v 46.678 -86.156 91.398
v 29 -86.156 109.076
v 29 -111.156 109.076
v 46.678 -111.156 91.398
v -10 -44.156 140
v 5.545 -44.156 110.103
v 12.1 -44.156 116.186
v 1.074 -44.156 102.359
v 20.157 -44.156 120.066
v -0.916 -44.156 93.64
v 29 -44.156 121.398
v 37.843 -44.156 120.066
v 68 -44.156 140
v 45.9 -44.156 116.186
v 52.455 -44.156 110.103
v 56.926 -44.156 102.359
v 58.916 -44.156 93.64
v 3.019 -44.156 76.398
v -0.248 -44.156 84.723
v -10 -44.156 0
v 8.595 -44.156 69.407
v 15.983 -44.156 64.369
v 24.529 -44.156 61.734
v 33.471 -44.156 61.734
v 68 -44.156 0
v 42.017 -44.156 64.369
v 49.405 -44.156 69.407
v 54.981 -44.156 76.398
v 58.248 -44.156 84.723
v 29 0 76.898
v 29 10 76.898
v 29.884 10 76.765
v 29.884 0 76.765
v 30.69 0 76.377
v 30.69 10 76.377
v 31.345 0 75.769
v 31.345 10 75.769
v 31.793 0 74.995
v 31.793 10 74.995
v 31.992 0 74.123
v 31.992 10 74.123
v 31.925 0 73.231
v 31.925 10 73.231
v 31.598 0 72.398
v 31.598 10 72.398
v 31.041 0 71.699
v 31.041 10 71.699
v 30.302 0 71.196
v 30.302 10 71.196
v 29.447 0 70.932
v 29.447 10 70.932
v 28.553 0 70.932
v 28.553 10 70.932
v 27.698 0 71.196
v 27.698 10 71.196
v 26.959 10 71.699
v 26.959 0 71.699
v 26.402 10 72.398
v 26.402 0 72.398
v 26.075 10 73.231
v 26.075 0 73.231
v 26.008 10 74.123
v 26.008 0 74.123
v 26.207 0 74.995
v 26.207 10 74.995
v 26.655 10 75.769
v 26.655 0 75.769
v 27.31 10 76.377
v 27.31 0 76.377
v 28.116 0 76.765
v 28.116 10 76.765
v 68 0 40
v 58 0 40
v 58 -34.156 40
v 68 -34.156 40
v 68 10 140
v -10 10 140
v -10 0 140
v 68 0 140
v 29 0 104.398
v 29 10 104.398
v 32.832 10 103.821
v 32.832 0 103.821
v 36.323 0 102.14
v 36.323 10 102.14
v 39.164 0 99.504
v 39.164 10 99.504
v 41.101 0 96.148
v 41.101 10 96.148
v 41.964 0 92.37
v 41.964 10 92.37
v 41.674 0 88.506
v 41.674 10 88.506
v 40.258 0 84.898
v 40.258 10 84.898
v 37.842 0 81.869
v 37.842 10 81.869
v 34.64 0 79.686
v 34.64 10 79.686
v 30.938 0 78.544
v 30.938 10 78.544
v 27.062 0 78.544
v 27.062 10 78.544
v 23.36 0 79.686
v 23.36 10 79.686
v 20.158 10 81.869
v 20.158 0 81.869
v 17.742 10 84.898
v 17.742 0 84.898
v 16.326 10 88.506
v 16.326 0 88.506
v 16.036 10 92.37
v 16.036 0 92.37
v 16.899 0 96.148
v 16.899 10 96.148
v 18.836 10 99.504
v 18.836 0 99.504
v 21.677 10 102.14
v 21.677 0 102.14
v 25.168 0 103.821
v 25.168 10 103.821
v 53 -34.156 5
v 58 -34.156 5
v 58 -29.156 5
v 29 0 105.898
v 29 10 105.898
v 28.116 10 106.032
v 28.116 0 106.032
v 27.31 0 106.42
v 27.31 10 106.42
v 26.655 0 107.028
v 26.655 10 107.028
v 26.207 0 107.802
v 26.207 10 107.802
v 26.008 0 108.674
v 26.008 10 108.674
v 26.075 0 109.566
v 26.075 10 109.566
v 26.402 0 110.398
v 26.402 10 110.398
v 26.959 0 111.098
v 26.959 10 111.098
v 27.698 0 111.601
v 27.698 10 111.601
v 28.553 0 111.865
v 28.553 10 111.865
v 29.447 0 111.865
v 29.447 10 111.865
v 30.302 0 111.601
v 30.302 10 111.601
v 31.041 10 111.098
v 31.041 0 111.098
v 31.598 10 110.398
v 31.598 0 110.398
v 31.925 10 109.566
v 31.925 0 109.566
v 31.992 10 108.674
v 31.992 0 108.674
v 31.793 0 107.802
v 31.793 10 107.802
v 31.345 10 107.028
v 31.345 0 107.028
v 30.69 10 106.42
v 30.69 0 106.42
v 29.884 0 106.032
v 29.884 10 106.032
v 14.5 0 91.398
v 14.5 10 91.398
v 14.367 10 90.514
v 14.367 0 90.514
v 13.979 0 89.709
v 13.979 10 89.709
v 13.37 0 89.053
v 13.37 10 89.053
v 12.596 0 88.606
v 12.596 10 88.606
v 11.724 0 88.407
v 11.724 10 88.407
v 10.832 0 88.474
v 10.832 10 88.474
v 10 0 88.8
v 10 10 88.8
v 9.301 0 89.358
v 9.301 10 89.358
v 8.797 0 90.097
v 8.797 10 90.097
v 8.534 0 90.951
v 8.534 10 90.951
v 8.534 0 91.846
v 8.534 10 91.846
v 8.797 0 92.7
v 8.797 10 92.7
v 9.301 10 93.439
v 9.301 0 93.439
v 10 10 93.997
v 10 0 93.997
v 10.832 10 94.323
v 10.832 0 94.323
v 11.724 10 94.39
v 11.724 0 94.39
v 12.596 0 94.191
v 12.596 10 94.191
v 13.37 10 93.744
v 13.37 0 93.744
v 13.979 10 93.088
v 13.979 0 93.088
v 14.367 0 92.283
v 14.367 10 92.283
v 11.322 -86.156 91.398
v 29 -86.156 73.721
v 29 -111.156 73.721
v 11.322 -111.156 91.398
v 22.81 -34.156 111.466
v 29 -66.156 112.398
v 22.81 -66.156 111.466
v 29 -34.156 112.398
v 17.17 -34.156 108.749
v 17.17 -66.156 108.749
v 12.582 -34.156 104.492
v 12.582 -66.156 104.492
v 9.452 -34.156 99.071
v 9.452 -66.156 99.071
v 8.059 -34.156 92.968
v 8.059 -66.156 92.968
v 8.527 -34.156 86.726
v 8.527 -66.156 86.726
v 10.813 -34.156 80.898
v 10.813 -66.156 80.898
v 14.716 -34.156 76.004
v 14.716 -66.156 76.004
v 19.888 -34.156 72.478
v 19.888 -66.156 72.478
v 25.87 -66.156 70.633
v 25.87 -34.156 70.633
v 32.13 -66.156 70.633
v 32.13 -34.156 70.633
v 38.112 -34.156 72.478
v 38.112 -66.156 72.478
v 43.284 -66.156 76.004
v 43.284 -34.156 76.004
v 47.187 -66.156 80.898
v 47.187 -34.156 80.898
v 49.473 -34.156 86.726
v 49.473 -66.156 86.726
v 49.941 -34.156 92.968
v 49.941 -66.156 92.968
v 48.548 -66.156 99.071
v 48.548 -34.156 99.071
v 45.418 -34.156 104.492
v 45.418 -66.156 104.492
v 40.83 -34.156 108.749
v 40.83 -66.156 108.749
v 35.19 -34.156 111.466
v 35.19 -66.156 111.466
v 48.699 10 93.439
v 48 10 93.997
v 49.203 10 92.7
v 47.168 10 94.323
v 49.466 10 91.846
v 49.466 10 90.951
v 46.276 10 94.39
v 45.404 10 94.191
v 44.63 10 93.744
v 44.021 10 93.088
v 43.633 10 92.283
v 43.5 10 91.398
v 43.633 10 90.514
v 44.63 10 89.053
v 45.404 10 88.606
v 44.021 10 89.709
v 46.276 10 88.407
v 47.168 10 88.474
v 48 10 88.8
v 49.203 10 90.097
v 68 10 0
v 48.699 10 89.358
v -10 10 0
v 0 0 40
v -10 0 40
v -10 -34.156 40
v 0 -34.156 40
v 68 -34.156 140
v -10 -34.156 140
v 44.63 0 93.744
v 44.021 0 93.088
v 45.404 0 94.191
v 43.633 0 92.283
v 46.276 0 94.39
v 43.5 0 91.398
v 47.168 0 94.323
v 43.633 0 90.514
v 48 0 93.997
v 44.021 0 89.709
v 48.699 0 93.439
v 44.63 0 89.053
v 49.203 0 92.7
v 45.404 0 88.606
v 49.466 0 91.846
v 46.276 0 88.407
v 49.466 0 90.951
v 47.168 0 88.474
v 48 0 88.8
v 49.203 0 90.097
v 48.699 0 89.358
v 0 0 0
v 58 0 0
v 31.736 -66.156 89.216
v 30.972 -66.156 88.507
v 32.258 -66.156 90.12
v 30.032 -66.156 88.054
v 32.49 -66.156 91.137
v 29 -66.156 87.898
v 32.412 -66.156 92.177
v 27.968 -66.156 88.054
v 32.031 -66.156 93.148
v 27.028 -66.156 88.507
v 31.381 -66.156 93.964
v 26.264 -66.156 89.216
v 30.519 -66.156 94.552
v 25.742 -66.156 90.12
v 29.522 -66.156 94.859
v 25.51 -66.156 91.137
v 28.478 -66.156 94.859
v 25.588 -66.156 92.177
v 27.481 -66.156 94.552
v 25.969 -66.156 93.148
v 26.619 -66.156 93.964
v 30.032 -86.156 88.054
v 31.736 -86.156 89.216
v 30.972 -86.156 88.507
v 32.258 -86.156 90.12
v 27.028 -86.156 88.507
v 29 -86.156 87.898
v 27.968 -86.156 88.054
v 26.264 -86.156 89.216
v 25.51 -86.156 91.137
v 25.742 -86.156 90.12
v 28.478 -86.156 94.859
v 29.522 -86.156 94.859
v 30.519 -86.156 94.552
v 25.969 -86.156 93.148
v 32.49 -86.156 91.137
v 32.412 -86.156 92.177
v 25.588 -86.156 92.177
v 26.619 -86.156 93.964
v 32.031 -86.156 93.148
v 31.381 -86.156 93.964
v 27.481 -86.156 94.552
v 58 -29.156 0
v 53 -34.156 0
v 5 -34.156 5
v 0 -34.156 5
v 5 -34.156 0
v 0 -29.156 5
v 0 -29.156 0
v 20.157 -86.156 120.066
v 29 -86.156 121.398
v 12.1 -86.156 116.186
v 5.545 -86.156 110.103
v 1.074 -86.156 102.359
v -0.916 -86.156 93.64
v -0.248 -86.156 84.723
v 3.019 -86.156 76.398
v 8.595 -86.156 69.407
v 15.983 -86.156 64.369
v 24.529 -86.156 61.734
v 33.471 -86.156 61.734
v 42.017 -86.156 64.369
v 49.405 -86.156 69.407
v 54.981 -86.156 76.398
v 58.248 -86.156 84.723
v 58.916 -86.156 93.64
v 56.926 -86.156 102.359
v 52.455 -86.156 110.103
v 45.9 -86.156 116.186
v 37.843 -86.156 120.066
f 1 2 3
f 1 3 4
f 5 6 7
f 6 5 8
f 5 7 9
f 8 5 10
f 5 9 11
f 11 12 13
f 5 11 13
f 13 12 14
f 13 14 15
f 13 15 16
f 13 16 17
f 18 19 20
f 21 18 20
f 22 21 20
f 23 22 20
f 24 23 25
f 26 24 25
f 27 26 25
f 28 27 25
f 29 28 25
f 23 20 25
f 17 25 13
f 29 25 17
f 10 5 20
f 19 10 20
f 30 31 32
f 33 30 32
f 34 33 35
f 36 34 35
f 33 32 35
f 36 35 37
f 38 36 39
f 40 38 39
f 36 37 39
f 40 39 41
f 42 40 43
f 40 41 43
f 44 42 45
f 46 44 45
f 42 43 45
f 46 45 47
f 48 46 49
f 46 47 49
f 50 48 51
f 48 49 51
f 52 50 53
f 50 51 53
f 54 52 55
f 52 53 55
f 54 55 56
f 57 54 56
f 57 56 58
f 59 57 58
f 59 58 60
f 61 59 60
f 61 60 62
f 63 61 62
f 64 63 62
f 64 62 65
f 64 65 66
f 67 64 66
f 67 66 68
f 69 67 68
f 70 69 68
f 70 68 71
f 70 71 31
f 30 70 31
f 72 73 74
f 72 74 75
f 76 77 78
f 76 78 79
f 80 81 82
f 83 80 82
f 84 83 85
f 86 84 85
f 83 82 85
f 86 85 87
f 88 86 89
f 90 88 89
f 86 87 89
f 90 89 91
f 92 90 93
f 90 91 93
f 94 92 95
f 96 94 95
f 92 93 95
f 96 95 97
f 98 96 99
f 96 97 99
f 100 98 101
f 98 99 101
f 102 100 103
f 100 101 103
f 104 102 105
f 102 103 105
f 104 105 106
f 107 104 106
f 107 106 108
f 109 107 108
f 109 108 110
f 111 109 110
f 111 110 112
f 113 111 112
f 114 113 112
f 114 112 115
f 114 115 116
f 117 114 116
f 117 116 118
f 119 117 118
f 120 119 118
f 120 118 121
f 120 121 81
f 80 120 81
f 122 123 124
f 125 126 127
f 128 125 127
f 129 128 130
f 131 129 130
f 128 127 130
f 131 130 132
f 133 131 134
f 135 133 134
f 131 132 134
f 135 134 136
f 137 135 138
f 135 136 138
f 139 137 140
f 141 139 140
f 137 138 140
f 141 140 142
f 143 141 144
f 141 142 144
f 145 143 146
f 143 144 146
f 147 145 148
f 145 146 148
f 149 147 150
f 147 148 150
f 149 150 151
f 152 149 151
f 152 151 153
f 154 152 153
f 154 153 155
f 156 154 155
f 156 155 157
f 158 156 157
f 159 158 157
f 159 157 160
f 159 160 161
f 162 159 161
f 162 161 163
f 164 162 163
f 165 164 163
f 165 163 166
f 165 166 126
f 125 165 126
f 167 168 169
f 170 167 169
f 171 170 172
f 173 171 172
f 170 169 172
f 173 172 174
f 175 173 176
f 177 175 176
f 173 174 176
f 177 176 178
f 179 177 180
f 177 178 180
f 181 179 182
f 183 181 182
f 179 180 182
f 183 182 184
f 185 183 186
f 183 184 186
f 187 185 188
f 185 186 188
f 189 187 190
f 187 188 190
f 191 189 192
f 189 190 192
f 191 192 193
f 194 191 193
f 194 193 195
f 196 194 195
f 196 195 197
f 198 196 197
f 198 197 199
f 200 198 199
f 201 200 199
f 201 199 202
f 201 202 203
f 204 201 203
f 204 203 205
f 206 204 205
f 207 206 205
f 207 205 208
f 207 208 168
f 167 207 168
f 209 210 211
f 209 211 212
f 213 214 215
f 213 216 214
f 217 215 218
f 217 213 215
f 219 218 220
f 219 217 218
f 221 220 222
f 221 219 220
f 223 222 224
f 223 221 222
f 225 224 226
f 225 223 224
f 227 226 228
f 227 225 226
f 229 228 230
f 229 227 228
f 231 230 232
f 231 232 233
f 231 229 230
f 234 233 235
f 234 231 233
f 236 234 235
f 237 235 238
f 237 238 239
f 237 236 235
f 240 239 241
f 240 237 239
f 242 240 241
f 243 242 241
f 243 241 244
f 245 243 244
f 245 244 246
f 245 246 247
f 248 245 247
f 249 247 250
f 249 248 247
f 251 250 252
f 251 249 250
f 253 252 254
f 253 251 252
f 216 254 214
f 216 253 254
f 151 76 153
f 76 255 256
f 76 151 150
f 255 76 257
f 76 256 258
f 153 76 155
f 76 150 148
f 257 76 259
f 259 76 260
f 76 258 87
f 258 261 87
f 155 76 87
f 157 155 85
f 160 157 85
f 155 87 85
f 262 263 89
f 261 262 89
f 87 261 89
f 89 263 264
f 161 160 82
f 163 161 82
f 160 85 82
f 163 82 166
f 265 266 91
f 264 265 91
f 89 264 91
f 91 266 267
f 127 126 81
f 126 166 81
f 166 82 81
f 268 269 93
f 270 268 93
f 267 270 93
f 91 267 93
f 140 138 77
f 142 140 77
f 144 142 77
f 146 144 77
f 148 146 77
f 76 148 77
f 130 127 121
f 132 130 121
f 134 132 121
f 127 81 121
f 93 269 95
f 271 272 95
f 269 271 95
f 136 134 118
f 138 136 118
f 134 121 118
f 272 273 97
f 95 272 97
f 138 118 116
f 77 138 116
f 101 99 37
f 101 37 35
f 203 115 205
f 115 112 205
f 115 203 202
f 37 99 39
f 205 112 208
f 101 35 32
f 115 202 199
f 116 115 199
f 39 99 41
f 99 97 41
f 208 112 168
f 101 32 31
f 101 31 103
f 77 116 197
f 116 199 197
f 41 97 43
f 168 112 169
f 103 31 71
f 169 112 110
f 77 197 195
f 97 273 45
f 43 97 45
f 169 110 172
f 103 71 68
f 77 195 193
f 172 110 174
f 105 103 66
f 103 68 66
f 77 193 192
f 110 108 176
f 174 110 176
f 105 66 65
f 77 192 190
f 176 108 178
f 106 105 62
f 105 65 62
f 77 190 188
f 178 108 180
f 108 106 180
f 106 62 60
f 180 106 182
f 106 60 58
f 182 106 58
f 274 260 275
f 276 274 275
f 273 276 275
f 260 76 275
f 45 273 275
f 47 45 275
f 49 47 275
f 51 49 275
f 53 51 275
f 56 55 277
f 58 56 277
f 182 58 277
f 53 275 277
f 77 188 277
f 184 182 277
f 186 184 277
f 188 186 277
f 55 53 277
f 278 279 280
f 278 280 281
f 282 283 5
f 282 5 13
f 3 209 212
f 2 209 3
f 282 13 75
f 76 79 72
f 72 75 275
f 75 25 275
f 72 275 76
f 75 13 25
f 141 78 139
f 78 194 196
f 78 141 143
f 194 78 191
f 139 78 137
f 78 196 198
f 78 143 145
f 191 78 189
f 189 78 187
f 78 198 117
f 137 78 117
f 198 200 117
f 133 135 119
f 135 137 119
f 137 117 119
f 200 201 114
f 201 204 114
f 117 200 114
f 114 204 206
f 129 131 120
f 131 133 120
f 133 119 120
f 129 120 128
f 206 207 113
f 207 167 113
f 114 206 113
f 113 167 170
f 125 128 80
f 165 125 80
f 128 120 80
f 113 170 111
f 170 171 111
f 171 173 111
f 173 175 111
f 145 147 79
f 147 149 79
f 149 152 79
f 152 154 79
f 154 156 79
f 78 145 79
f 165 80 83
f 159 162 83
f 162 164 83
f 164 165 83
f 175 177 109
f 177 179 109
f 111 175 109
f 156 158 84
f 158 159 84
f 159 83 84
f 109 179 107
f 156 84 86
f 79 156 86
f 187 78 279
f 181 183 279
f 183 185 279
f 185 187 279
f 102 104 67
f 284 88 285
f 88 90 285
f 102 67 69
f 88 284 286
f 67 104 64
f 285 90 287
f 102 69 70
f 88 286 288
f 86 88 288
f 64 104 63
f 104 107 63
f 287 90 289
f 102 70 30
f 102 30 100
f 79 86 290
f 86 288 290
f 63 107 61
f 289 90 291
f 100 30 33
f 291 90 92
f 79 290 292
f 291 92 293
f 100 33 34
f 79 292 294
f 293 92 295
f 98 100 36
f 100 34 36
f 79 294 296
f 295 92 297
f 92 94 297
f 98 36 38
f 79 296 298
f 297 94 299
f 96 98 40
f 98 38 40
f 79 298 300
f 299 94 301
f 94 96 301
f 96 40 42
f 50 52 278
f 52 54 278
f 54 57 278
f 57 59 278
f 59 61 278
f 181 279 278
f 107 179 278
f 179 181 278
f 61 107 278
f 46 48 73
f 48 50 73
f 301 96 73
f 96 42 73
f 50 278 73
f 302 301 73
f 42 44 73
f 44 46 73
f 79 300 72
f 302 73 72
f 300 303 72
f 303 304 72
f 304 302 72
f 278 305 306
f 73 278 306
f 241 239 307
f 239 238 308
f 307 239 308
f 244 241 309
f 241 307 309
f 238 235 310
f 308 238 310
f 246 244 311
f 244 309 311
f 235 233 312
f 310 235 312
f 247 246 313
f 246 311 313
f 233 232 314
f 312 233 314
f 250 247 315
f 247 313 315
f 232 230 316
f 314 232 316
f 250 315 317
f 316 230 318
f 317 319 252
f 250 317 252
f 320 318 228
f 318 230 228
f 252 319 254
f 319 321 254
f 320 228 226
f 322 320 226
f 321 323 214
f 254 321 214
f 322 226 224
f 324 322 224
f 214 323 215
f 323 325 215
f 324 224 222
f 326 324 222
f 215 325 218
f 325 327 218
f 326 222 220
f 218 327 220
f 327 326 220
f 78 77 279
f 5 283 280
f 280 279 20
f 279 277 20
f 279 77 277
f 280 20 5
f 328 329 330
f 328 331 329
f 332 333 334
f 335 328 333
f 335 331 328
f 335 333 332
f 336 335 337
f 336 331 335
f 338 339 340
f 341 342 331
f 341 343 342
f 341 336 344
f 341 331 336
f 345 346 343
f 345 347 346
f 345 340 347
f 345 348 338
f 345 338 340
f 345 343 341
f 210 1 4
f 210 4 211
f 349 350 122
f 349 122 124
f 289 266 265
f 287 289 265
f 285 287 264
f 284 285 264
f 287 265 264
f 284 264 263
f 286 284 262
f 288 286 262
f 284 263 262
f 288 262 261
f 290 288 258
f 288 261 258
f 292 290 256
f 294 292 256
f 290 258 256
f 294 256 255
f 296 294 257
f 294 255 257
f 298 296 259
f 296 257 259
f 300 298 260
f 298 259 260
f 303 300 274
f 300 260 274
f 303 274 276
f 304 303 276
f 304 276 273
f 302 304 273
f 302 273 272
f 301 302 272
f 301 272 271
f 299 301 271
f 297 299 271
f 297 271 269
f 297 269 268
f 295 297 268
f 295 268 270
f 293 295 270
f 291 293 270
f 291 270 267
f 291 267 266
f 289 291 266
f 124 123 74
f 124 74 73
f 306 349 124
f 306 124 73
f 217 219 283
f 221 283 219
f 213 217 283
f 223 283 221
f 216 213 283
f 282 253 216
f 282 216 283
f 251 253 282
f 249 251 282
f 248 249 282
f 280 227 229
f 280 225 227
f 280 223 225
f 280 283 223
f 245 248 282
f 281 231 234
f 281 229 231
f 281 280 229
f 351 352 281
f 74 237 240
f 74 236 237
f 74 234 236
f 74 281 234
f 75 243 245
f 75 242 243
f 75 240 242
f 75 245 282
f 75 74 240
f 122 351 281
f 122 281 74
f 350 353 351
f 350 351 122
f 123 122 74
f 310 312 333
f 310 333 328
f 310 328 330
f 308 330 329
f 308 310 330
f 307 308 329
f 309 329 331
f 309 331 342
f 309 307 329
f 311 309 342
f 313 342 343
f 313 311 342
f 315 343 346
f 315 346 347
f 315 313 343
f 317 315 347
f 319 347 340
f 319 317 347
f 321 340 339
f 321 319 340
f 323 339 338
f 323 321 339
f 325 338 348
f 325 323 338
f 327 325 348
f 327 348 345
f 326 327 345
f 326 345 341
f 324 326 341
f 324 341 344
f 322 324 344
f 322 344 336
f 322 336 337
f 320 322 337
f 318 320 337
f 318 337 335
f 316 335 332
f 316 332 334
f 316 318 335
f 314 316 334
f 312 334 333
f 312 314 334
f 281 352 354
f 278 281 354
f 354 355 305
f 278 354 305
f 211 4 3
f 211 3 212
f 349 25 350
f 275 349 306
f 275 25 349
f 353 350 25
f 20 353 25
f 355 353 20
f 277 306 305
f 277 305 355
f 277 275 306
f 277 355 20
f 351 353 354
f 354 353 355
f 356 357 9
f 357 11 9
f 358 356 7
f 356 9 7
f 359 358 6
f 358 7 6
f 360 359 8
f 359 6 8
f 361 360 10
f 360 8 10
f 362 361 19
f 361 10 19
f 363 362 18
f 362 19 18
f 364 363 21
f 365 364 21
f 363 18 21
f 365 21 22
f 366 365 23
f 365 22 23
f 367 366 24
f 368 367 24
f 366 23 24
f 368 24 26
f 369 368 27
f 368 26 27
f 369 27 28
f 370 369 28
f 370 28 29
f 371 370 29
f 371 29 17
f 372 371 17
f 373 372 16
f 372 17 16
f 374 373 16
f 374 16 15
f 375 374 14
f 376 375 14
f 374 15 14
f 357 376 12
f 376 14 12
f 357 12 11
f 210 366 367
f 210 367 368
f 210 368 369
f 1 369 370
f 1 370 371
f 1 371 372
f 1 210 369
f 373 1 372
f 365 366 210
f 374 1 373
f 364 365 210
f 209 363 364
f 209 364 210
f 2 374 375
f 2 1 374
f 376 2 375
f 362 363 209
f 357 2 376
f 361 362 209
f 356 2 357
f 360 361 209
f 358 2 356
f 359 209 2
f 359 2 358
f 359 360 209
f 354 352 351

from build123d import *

# Parameters (mm, degrees)
SKETCH_1_W               = 78
SKETCH_1_H               = 54.155555556
SKETCH_1_W_2             = 58
SKETCH_1_H_2             = 34.155555556
EXTRUDE_1_DEPTH          = 40
SKETCH_2_W               = 78
SKETCH_2_H               = 10
EXTRUDE_1_2_DEPTH        = 100
EXTRUDE_2_DEPTH          = 5
SKETCH_4_R               = 21
CUT_EXTRUDE_1_DEPTH      = 162.782919637
EXTRUDE_3_DEPTH          = 100
CUT_EXTRUDE_2_REACH      = 166.793
SKETCH_6_R               = 13
SKETCH_8_R               = 3
CUT_EXTRUDE_3_DEPTH      = 35
PATTERN_CIRCULAR_1_COUNT = 4
SKETCH_9_R               = 30
SKETCH_9_R_2             = 21
EXTRUDE_4_DEPTH          = 22
SKETCH_10_R              = 30
SKETCH_10_R_2            = 3.5
EXTRUDE_5_DEPTH          = 20
EXTRUDE_6_DEPTH          = 25


with BuildPart() as part:
    # 草图1 → Extrude 1 (new body)
    with BuildSketch(Plane.XY):
        with Locations((29, -17.077777778)):
            Rectangle(SKETCH_1_W, SKETCH_1_H)
        with Locations((29, -17.077777778)):
            Rectangle(SKETCH_1_W_2, SKETCH_1_H_2, mode=Mode.SUBTRACT)
    extrude(amount=EXTRUDE_1_DEPTH)

    # 草图2 → Extrude 1 2 (add)
    with BuildSketch(Plane.XY.offset(40)):
        with Locations((29, -39.155555556)):
            Rectangle(SKETCH_2_W, SKETCH_2_H)
    extrude(amount=EXTRUDE_1_2_DEPTH)

    # 草图3 → 凸台-拉伸2 (add)
    with BuildSketch(Plane(origin=(0, 0, 0), x_dir=(-1, 0, 0), z_dir=(0, 0, -1))):
        Polygon((-58, -29.155555556), (-58, -34.155555556), (-53, -34.155555556), align=None)
        Polygon((0, -29.155555556), (0, -34.155555556), (-5, -34.155555556), align=None)
    extrude(amount=-EXTRUDE_2_DEPTH)

    # 草图4 → 切除-拉伸1 (cut, through all)
    with BuildSketch(Plane(origin=(0, -34.155555556, 0), x_dir=(1, 0, 0), z_dir=(0, 1, 0))):
        with Locations(Location((29, -91.398483043, 0), (0, 0, 270))):
            Circle(SKETCH_4_R)
    extrude(amount=-CUT_EXTRUDE_1_DEPTH, mode=Mode.SUBTRACT)

    # 草图5 → 凸台-拉伸3 (add)
    with BuildSketch(Plane.XY.offset(40)):
        Polygon((-10, 10), (-10, 0), (0, 0), (58, 0), (68, 0), (68, 10), align=None)
    extrude(amount=EXTRUDE_3_DEPTH)

    # 草图6 → 切除-拉伸2 (cut, up to next)
    with BuildSketch(Plane(origin=(0, 10, 0), x_dir=(1, 0, 0), z_dir=(0, 1, 0)), mode=Mode.PRIVATE) as cut_extrude_2_sk1:
        with Locations(Location((29, -91.398483043, 0), (0, 0, 270))):
            Circle(SKETCH_6_R)
    cut_extrude_2_tool1 = extrude(cut_extrude_2_sk1.sketch, amount=-CUT_EXTRUDE_2_REACH, mode=Mode.PRIVATE) & part.part
    add(cut_extrude_2_tool1.solids().sort_by_distance((29, 10, 91.398483))[0], mode=Mode.SUBTRACT)

    # 草图8 → 切除-拉伸3 (cut)
    with BuildSketch(Plane(origin=(0, 10, 0), x_dir=(1, 0, 0), z_dir=(0, 1, 0))):
        with Locations(Location((29, -73.898483043, 0), (0, 0, 270))):
            Circle(SKETCH_8_R)
    cut_extrude_3 = extrude(amount=-CUT_EXTRUDE_3_DEPTH, mode=Mode.SUBTRACT)

    # 阵列(圆周)1: 切除-拉伸3 ×4 about axis
    pattern_circular_1_axis = Axis((29, 0, 91.398483043), (0, 1, 0))
    for i in range(1, PATTERN_CIRCULAR_1_COUNT):
        add(cut_extrude_3.rotate(pattern_circular_1_axis, i * 360 / PATTERN_CIRCULAR_1_COUNT), mode=Mode.SUBTRACT)

    # 草图9 → 凸台-拉伸4 (add)
    with BuildSketch(Plane.XZ.offset(44.155555556)):
        with Locations(Location((29, 91.398483043, 0), (0, 0, 90))):
            Circle(SKETCH_9_R)
        with Locations(Location((29, 91.398483043, 0), (0, 0, 90))):
            Circle(SKETCH_9_R_2, mode=Mode.SUBTRACT)
    extrude(amount=EXTRUDE_4_DEPTH)

    # 草图10 → 凸台-拉伸5 (add)
    with BuildSketch(Plane.XZ.offset(66.155555556)):
        with Locations(Location((29, 91.398483043, 0), (0, 0, 90))):
            Circle(SKETCH_10_R)
        with Locations(Location((29, 91.398483043, 0), (0, 0, 270))):
            Circle(SKETCH_10_R_2, mode=Mode.SUBTRACT)
    extrude(amount=EXTRUDE_5_DEPTH)

    # 草图12 → 凸台-拉伸6 (add)
    with BuildSketch(Plane.XZ.offset(86.155555556)):
        Polygon((11.32233047, 91.398483043), (29, 109.076152573), (46.67766953, 91.398483043), (29, 73.720813513), align=None)
    extrude(amount=EXTRUDE_6_DEPTH)


solid = part.part
